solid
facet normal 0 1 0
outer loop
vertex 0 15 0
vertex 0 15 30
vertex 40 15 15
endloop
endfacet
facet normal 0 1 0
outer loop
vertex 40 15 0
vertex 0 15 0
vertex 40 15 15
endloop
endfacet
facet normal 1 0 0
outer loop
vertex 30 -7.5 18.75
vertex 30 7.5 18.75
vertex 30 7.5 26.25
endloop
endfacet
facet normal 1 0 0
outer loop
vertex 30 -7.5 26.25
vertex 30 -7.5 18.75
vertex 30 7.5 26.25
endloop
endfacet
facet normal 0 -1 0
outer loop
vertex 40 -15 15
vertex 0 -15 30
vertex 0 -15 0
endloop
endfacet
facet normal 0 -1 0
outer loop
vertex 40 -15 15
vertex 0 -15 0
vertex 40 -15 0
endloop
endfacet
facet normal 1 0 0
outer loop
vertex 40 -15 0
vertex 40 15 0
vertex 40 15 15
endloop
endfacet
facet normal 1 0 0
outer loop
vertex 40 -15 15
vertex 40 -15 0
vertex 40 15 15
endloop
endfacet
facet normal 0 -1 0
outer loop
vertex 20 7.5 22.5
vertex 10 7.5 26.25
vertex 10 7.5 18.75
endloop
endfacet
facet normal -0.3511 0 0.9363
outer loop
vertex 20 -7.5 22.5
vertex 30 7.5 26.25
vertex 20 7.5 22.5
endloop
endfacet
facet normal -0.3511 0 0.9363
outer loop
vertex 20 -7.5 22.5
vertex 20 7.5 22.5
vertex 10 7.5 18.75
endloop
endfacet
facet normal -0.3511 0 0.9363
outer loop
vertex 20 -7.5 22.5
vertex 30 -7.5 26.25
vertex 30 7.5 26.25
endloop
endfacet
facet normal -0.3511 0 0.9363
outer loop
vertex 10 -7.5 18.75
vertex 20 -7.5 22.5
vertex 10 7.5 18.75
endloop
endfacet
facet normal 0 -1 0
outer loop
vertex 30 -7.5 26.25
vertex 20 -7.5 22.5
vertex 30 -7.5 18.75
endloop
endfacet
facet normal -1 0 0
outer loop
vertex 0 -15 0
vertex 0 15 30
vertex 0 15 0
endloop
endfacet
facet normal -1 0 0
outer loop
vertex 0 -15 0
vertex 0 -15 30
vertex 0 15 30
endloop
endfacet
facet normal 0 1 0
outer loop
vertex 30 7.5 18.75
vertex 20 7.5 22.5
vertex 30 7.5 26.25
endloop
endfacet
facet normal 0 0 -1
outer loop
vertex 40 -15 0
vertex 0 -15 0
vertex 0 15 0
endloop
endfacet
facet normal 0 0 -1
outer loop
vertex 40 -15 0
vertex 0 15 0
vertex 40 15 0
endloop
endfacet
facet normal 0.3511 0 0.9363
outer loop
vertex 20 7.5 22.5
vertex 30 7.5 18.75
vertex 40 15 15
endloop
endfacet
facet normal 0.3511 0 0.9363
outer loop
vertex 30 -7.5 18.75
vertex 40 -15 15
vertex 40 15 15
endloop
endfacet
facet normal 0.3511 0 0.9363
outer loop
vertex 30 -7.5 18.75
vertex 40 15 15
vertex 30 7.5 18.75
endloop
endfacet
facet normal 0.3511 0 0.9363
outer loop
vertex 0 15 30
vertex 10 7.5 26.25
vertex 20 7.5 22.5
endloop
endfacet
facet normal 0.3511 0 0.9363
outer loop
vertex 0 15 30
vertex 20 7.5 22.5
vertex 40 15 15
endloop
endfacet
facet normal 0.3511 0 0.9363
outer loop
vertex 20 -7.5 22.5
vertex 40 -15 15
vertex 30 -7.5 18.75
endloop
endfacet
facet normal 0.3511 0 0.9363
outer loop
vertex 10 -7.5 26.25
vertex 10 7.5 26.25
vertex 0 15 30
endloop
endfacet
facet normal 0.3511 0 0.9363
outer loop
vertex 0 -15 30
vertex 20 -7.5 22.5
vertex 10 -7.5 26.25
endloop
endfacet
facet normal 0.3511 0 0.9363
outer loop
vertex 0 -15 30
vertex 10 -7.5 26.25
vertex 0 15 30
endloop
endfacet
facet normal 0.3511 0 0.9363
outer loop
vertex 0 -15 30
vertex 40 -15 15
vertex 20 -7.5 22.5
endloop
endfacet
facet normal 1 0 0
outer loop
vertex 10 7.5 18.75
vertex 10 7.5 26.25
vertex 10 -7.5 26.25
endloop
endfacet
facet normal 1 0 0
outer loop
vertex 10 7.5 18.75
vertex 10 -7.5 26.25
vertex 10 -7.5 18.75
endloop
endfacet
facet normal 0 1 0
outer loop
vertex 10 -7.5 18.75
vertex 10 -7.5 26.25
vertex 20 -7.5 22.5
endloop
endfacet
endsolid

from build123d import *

# Parameters (mm, degrees)
F1_DEPTH = 15
F2_DEPTH = 7.5
F3_DEPTH = 7.5


with BuildPart() as f1:
    # F0 (on Front) → F1 (new body, symmetric)
    with BuildSketch(Plane.XZ):
        Polygon((0, 30), (0, 0), (40, 0), (40, 15), (30, 18.75), (10, 18.75), (10, 26.25), align=None)
        Polygon((10, 18.75), (30, 18.75), (20, 22.5), align=None)
        Polygon((20, 22.5), (10, 26.25), (10, 18.75), align=None)
    extrude(amount=F1_DEPTH, both=True)

    # F0 (on Front) → F2 (cut, symmetric)
    with BuildSketch(Plane.XZ):
        Polygon((20, 22.5), (10, 26.25), (10, 18.75), align=None)
    extrude(amount=F2_DEPTH, both=True, mode=Mode.SUBTRACT)

    # F0 (on Front) → F3 (join, symmetric)
    with BuildSketch(Plane.XZ):
        Polygon((20, 22.5), (30, 18.75), (30, 26.25), align=None)
    extrude(amount=F3_DEPTH, both=True)


solid = f1.part
